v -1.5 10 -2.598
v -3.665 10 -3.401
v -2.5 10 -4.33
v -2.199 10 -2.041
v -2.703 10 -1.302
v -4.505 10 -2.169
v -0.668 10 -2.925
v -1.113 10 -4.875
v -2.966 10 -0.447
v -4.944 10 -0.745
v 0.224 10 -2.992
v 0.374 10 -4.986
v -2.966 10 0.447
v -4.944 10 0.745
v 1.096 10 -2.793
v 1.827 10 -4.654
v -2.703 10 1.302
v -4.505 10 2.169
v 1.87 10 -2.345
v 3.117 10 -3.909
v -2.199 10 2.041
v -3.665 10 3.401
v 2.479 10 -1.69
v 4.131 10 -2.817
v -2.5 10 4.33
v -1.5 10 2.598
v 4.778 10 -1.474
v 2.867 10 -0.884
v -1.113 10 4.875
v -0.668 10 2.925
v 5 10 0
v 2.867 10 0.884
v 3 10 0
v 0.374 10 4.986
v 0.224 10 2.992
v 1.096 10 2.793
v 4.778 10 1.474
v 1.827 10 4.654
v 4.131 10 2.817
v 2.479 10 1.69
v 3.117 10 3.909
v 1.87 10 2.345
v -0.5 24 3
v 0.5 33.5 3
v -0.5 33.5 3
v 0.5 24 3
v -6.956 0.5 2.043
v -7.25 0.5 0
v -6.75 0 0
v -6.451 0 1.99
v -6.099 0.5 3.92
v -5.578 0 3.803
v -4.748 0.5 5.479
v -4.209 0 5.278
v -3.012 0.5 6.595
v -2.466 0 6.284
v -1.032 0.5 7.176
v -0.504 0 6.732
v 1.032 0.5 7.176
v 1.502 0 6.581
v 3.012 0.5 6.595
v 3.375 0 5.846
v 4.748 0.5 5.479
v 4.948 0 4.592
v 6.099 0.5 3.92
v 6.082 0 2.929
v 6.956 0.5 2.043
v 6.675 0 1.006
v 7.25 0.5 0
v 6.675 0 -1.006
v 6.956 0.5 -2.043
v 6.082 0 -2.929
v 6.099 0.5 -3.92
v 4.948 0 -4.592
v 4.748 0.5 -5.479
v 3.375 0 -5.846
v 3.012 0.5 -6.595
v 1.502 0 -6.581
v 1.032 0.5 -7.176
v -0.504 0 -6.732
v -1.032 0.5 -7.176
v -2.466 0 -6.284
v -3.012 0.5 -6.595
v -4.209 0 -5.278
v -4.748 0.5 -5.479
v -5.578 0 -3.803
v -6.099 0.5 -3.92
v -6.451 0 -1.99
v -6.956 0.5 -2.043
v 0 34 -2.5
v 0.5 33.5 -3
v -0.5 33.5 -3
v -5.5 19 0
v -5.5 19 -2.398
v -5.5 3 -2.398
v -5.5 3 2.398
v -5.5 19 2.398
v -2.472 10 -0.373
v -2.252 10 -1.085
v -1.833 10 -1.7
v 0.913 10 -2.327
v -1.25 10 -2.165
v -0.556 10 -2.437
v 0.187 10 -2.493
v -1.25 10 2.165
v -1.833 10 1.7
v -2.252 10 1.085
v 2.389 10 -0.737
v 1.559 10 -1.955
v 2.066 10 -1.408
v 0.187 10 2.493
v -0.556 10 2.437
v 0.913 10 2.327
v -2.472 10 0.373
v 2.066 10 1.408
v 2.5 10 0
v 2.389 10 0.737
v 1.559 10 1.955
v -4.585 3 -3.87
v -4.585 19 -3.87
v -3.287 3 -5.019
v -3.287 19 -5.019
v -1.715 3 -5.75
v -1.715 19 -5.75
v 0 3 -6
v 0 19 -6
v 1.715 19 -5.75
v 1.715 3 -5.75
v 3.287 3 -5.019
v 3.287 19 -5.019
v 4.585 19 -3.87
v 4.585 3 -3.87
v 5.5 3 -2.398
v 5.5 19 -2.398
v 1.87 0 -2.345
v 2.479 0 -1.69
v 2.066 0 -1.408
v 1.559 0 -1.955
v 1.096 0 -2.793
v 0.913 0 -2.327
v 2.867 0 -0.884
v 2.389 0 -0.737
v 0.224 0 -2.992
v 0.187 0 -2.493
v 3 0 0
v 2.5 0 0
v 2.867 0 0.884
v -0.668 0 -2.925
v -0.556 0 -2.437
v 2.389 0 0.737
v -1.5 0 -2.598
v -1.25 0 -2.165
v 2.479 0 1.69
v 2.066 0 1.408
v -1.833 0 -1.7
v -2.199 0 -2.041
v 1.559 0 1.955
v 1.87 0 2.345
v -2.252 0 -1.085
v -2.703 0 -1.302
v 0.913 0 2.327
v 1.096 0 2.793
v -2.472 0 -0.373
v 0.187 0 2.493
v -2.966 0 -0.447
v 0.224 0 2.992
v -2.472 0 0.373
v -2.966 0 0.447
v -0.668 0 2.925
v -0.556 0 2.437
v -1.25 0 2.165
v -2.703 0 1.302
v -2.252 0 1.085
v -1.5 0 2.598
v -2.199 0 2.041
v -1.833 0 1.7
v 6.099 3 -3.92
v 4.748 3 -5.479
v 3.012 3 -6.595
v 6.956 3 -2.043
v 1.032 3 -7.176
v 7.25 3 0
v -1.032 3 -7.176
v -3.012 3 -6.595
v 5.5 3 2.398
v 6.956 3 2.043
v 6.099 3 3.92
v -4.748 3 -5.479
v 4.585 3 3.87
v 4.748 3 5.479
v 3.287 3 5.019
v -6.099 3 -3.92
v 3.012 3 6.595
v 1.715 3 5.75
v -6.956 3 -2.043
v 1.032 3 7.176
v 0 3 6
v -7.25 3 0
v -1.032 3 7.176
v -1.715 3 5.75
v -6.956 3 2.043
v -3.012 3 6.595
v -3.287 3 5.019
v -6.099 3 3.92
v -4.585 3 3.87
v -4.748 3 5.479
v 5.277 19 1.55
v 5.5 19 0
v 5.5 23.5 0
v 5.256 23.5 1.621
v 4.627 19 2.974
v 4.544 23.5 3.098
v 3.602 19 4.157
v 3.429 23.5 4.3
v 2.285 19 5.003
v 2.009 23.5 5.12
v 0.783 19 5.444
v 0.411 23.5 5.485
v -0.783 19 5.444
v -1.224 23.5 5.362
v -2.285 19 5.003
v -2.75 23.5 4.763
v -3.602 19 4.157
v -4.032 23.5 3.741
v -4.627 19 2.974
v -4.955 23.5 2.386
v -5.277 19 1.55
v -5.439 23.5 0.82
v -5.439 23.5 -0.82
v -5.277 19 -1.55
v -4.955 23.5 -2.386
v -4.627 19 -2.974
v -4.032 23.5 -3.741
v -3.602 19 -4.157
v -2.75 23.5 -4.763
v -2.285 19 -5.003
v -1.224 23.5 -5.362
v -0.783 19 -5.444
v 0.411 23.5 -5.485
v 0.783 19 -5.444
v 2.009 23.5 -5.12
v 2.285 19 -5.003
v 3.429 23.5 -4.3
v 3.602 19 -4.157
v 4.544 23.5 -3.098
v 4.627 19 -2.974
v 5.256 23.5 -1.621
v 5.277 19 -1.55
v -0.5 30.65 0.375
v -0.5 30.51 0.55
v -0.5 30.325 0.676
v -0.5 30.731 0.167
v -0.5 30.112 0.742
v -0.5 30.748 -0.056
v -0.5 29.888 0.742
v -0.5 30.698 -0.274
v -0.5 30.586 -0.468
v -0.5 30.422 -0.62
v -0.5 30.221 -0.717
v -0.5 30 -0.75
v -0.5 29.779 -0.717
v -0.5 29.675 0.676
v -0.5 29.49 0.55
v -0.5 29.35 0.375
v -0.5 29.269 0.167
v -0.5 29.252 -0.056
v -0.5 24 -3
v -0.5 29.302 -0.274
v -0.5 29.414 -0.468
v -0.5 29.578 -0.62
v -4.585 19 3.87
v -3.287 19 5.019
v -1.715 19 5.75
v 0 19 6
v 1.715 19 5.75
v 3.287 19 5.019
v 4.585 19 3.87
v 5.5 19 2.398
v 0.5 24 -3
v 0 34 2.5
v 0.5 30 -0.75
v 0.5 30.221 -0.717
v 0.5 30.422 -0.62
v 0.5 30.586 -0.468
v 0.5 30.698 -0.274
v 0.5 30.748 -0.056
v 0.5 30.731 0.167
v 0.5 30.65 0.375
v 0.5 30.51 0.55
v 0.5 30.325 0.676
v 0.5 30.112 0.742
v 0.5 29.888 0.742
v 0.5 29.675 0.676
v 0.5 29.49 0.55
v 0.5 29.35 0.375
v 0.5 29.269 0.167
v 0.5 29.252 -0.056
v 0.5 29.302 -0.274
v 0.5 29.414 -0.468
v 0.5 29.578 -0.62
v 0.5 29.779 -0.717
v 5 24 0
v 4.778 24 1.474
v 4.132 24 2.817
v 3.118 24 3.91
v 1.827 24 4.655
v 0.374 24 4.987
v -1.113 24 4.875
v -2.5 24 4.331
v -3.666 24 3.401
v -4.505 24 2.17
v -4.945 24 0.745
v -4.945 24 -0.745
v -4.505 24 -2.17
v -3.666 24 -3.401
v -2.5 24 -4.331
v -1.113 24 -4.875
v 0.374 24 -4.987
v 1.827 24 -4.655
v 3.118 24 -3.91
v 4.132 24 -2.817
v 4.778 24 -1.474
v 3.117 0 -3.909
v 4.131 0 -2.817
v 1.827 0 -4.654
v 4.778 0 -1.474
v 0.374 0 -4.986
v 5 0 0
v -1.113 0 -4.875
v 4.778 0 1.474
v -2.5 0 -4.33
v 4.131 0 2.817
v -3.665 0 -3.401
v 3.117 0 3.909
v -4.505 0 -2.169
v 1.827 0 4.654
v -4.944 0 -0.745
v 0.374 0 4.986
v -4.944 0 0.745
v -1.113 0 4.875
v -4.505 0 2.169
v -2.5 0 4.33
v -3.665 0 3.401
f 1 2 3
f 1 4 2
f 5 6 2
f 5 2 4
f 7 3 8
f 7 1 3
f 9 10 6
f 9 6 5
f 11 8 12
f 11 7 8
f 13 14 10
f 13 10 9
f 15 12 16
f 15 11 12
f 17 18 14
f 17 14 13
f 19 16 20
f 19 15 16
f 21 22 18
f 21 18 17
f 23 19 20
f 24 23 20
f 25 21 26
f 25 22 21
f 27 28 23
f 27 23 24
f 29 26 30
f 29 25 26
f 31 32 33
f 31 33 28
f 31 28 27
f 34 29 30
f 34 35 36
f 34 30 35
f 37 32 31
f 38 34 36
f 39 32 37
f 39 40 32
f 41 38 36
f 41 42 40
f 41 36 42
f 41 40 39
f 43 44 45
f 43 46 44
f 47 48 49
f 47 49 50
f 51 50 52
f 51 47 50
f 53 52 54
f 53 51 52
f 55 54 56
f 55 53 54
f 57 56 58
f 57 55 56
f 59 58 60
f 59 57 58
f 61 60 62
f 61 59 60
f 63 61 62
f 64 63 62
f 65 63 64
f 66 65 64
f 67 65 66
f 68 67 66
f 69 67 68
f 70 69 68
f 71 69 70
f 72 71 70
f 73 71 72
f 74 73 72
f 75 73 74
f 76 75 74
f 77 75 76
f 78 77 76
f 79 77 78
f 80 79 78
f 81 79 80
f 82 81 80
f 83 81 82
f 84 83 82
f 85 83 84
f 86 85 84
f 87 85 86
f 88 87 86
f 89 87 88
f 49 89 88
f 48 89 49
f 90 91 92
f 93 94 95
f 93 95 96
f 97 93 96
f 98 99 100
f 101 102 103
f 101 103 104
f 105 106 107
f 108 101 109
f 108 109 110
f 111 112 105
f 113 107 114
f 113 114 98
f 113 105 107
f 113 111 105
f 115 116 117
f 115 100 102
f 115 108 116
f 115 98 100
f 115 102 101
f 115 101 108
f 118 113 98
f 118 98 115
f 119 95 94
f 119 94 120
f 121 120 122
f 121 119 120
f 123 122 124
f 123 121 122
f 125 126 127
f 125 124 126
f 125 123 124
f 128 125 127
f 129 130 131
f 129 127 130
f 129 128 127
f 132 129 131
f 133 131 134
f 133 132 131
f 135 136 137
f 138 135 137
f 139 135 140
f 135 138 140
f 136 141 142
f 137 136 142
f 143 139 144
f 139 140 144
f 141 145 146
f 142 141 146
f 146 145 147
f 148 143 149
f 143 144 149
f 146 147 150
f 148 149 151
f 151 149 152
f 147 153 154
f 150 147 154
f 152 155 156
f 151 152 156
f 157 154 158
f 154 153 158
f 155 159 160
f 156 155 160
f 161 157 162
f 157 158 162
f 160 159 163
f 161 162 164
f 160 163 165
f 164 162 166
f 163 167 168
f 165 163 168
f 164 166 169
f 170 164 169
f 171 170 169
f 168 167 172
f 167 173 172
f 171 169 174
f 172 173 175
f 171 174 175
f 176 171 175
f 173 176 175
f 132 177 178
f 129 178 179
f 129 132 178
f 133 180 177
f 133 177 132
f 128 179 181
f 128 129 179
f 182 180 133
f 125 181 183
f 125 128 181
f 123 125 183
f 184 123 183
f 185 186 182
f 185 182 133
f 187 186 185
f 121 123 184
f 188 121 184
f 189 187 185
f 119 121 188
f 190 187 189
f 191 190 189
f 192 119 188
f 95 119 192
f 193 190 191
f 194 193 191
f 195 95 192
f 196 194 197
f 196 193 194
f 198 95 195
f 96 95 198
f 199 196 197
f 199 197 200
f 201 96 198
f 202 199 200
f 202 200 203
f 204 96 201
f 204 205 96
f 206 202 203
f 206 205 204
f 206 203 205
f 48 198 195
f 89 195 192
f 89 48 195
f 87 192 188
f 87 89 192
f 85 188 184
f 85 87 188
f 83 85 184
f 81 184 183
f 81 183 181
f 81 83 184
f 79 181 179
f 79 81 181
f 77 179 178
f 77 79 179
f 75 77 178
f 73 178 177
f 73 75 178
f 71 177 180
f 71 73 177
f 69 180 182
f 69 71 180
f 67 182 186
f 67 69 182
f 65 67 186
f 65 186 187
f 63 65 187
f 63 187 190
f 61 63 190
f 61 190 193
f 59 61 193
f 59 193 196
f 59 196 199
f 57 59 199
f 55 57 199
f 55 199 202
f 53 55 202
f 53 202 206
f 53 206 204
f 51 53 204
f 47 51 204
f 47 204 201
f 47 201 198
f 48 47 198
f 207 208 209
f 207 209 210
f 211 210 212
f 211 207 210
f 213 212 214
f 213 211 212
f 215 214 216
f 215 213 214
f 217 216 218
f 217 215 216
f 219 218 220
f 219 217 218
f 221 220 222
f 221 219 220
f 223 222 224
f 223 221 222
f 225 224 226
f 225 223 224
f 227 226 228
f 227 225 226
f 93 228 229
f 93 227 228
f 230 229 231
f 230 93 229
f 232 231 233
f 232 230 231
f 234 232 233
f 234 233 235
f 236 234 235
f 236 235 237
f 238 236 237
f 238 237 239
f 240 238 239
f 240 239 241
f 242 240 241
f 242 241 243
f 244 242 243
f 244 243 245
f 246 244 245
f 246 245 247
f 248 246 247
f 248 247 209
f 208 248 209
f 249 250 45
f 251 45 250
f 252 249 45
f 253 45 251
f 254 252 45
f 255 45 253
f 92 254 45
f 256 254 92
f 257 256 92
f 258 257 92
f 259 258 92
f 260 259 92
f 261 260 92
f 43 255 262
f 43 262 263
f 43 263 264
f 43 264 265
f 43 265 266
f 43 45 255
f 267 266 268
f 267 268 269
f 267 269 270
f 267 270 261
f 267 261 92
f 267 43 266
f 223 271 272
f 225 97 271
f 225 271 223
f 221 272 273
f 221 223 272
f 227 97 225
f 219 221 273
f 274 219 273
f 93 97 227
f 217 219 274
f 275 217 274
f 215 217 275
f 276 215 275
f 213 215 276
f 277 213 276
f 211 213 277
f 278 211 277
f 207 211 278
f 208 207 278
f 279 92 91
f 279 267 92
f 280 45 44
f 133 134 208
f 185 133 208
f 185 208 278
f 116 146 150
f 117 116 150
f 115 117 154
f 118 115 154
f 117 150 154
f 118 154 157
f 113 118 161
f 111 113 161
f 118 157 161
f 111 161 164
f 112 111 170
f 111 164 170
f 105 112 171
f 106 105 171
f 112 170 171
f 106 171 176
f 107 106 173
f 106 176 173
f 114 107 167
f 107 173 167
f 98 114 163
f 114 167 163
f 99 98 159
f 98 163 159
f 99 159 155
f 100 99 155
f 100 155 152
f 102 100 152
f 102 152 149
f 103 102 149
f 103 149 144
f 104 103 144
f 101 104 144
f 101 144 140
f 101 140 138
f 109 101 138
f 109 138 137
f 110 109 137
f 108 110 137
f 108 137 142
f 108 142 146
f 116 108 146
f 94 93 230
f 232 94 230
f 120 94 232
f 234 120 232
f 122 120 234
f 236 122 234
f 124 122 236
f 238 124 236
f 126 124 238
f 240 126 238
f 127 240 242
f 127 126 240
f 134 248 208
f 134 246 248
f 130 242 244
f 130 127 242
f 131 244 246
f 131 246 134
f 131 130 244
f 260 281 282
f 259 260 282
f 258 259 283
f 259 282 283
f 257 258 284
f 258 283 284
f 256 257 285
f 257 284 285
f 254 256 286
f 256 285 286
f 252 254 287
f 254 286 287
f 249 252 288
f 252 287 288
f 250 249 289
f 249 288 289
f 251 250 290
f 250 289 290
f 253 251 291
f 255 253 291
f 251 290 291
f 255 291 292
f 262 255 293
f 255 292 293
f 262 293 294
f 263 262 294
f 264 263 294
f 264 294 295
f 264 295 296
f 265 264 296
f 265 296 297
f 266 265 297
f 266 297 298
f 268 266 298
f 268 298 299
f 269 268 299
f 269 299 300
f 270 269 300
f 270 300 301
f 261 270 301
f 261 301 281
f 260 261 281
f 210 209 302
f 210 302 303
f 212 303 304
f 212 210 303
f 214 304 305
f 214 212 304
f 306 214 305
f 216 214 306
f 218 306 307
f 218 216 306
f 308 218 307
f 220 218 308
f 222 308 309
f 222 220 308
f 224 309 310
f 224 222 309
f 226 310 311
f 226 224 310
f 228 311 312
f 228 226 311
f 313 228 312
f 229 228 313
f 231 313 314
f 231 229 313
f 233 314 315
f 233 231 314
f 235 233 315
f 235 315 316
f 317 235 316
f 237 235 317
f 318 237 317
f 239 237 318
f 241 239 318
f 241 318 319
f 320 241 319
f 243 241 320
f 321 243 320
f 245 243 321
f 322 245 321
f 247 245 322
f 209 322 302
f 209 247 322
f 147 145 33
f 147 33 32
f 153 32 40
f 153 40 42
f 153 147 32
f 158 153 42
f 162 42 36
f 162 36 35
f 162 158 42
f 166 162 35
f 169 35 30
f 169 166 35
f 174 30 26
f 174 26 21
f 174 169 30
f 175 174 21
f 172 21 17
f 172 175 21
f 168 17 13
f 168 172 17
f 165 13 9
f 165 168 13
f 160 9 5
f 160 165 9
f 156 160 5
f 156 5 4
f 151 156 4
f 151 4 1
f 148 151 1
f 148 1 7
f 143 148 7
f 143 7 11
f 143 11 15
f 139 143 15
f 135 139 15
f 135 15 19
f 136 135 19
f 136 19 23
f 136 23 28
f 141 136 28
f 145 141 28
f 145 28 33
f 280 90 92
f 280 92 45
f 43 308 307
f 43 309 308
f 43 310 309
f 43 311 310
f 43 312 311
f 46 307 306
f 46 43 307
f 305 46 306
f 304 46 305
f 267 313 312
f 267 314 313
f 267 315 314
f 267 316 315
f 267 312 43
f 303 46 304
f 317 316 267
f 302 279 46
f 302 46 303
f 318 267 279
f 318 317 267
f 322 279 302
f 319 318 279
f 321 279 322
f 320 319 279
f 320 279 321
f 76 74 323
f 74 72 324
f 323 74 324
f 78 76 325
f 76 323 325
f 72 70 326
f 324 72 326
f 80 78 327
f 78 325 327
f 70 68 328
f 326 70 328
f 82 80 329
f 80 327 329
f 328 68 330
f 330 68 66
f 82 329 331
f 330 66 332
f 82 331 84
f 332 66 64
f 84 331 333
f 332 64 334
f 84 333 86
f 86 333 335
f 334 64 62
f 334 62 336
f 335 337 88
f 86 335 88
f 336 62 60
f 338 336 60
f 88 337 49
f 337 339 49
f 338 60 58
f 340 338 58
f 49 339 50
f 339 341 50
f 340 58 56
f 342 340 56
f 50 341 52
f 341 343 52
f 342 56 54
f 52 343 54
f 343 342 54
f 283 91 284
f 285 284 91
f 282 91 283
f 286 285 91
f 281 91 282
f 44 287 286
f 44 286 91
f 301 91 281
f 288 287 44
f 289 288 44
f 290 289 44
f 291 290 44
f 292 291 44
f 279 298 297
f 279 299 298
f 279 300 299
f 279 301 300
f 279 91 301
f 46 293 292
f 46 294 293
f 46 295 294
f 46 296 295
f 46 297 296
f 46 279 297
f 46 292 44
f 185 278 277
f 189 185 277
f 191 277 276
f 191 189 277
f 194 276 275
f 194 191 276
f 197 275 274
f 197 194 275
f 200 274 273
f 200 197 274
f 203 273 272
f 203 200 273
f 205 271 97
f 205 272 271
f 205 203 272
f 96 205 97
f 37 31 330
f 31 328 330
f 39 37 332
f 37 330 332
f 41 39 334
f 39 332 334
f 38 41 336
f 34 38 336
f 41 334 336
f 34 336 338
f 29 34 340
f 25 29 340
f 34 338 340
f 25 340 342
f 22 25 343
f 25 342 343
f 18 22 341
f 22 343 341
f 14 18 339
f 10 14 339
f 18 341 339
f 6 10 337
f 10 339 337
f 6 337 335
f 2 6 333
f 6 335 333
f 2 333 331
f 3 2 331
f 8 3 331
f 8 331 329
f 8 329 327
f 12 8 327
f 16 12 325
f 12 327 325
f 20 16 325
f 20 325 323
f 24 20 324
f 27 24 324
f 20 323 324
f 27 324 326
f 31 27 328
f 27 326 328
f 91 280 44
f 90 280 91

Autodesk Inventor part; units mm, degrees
ref_plane "YZ Plane" through (0, 0, 0) normal (1, 0, 0) x (0, 1, 0)
ref_plane "XZ Plane" through (0, 0, 0) normal (0, 1, 0) x (-1, 0, 0)
ref_plane "XY Plane" through (0, 0, 0) normal (0, 0, 1) x (1, 0, 0)
sketch "Esquisse1" plane through (0, 0, 0) normal (0, 1, 0) x (-1, 0, 0)
  circle A0 centre (0, 0) radius 7.25
  dimension "d0" = 14.5
extrude "Extrusion1" add sketch "Esquisse1" along normal blind 3
sketch "Esquisse2" plane through (0, 3, 0) normal (0, 1, 0) x (1, 0, 0)
  circle A0 centre (0, 0) radius 6
  dimension "d3" = 12
extrude "Extrusion2" add sketch "Esquisse2" along normal blind 16
sketch "Esquisse3" plane through (0, 19, 0) normal (0, 1, 0) x (1, 0, 0)
  circle A0 centre (0, 0) radius 5.5
  dimension "d6" = 11
extrude "Extrusion3" add sketch "Esquisse3" along normal blind 5
thread "Filetage1" size "M12x0.5" class "6g" standard "ANSI Metric M Profile" full length
sketch "Esquisse4" plane through (0, 24, 0) normal (0, 1, 0) x (1, 0, 0)
  line L0 (-7.5, 3) -> (-5.5, 3)
  line L1 (-5.5, 3) -> (-5.5, -3)
  line L2 (-5.5, -3) -> (-7.5, -3)
  line L3 (-7.5, -3) -> (-7.5, 3)
  line L4 (7.5, 3) -> (5.5, 3)
  line L5 (5.5, 3) -> (5.5, -3)
  line L6 (5.5, -3) -> (7.5, -3)
  line L7 (7.5, -3) -> (7.5, 3)
  circle A0 centre (0, 0) radius 5.5 projected
  circle A1 centre (0, 0) radius 5.5 projected
  point P0 (-5.5, 0)
  point P1 (5.5, 0)
  dimension "d11" = 2
  dimension "d12" = 11
  dimension "d13" = 5.5
  dimension "d14" = 5.5
  dimension "d15" = 11
  dimension "d16" = 2
  dimension "d17" = 6
  dimension "d18" = 3
extrude "Extrusion4" cut sketch "Esquisse4" against normal blind 21 contours L5 L4 L7 L6 | L0 L1 L2 L3
sketch "Esquisse5" plane through (0, 24, 0) normal (0, 1, 0) x (1, 0, 0)
  line L0 (-0.5, 3) -> (0.5, 3)
  line L1 (0.5, 3) -> (0.5, -3)
  line L2 (0.5, -3) -> (-0.5, -3)
  line L3 (-0.5, -3) -> (-0.5, 3)
  point P0 (0, 0)
  dimension "d21" = 1
  dimension "d22" = 0.5
  dimension "d23" = 6
  dimension "d24" = 3
extrude "Extrusion5" add sketch "Esquisse5" along normal blind 10
sketch "Esquisse6" plane through (0, 0, 0) normal (0, -1, 0) x (1, 0, 0)
  circle A0 centre (0, 0) radius 5
  circle A1 centre (0, 0) radius 3
  circle A2 centre (0, 0) radius 2.5
  dimension "d27" = 10
  dimension "d28" = 6
  dimension "d29" = 5
extrude "Extrusion6" cut sketch "Esquisse6" against normal blind 10
chamfer "Chanfrein1" distance 0.5 angle 45 6 edges at (7.25, 0, 0) (-5.5, 24, 0) (0, 34, -3) (0, 34, 3) (0.5, 34, 0) (-0.5, 34, 0)
sketch "Esquisse7" plane through (0.5, 24, 3) normal (1, 0, 0) x (0, 0, -1)
  circle A0 centre (3, 6) radius 0.75
  line L0 (-2, 0) -> (8, 0) projected
  point P0 (3, -24)
  dimension "d35" = 1.5
  dimension "d36" = 6
extrude "Extrusion7" cut sketch "Esquisse7" against normal blind 10
equation "\"d14\" = d13"
equation "\"d15\" = d12"
equation "\"d16\" = d11"
equation "\"d18\" = 0.5 * d17"
equation "\"d22\" = 0.5 * d21"
equation "\"d24\" = 0.5 * d23"
properties part number "Prise banane" material "Plastique ABS"
